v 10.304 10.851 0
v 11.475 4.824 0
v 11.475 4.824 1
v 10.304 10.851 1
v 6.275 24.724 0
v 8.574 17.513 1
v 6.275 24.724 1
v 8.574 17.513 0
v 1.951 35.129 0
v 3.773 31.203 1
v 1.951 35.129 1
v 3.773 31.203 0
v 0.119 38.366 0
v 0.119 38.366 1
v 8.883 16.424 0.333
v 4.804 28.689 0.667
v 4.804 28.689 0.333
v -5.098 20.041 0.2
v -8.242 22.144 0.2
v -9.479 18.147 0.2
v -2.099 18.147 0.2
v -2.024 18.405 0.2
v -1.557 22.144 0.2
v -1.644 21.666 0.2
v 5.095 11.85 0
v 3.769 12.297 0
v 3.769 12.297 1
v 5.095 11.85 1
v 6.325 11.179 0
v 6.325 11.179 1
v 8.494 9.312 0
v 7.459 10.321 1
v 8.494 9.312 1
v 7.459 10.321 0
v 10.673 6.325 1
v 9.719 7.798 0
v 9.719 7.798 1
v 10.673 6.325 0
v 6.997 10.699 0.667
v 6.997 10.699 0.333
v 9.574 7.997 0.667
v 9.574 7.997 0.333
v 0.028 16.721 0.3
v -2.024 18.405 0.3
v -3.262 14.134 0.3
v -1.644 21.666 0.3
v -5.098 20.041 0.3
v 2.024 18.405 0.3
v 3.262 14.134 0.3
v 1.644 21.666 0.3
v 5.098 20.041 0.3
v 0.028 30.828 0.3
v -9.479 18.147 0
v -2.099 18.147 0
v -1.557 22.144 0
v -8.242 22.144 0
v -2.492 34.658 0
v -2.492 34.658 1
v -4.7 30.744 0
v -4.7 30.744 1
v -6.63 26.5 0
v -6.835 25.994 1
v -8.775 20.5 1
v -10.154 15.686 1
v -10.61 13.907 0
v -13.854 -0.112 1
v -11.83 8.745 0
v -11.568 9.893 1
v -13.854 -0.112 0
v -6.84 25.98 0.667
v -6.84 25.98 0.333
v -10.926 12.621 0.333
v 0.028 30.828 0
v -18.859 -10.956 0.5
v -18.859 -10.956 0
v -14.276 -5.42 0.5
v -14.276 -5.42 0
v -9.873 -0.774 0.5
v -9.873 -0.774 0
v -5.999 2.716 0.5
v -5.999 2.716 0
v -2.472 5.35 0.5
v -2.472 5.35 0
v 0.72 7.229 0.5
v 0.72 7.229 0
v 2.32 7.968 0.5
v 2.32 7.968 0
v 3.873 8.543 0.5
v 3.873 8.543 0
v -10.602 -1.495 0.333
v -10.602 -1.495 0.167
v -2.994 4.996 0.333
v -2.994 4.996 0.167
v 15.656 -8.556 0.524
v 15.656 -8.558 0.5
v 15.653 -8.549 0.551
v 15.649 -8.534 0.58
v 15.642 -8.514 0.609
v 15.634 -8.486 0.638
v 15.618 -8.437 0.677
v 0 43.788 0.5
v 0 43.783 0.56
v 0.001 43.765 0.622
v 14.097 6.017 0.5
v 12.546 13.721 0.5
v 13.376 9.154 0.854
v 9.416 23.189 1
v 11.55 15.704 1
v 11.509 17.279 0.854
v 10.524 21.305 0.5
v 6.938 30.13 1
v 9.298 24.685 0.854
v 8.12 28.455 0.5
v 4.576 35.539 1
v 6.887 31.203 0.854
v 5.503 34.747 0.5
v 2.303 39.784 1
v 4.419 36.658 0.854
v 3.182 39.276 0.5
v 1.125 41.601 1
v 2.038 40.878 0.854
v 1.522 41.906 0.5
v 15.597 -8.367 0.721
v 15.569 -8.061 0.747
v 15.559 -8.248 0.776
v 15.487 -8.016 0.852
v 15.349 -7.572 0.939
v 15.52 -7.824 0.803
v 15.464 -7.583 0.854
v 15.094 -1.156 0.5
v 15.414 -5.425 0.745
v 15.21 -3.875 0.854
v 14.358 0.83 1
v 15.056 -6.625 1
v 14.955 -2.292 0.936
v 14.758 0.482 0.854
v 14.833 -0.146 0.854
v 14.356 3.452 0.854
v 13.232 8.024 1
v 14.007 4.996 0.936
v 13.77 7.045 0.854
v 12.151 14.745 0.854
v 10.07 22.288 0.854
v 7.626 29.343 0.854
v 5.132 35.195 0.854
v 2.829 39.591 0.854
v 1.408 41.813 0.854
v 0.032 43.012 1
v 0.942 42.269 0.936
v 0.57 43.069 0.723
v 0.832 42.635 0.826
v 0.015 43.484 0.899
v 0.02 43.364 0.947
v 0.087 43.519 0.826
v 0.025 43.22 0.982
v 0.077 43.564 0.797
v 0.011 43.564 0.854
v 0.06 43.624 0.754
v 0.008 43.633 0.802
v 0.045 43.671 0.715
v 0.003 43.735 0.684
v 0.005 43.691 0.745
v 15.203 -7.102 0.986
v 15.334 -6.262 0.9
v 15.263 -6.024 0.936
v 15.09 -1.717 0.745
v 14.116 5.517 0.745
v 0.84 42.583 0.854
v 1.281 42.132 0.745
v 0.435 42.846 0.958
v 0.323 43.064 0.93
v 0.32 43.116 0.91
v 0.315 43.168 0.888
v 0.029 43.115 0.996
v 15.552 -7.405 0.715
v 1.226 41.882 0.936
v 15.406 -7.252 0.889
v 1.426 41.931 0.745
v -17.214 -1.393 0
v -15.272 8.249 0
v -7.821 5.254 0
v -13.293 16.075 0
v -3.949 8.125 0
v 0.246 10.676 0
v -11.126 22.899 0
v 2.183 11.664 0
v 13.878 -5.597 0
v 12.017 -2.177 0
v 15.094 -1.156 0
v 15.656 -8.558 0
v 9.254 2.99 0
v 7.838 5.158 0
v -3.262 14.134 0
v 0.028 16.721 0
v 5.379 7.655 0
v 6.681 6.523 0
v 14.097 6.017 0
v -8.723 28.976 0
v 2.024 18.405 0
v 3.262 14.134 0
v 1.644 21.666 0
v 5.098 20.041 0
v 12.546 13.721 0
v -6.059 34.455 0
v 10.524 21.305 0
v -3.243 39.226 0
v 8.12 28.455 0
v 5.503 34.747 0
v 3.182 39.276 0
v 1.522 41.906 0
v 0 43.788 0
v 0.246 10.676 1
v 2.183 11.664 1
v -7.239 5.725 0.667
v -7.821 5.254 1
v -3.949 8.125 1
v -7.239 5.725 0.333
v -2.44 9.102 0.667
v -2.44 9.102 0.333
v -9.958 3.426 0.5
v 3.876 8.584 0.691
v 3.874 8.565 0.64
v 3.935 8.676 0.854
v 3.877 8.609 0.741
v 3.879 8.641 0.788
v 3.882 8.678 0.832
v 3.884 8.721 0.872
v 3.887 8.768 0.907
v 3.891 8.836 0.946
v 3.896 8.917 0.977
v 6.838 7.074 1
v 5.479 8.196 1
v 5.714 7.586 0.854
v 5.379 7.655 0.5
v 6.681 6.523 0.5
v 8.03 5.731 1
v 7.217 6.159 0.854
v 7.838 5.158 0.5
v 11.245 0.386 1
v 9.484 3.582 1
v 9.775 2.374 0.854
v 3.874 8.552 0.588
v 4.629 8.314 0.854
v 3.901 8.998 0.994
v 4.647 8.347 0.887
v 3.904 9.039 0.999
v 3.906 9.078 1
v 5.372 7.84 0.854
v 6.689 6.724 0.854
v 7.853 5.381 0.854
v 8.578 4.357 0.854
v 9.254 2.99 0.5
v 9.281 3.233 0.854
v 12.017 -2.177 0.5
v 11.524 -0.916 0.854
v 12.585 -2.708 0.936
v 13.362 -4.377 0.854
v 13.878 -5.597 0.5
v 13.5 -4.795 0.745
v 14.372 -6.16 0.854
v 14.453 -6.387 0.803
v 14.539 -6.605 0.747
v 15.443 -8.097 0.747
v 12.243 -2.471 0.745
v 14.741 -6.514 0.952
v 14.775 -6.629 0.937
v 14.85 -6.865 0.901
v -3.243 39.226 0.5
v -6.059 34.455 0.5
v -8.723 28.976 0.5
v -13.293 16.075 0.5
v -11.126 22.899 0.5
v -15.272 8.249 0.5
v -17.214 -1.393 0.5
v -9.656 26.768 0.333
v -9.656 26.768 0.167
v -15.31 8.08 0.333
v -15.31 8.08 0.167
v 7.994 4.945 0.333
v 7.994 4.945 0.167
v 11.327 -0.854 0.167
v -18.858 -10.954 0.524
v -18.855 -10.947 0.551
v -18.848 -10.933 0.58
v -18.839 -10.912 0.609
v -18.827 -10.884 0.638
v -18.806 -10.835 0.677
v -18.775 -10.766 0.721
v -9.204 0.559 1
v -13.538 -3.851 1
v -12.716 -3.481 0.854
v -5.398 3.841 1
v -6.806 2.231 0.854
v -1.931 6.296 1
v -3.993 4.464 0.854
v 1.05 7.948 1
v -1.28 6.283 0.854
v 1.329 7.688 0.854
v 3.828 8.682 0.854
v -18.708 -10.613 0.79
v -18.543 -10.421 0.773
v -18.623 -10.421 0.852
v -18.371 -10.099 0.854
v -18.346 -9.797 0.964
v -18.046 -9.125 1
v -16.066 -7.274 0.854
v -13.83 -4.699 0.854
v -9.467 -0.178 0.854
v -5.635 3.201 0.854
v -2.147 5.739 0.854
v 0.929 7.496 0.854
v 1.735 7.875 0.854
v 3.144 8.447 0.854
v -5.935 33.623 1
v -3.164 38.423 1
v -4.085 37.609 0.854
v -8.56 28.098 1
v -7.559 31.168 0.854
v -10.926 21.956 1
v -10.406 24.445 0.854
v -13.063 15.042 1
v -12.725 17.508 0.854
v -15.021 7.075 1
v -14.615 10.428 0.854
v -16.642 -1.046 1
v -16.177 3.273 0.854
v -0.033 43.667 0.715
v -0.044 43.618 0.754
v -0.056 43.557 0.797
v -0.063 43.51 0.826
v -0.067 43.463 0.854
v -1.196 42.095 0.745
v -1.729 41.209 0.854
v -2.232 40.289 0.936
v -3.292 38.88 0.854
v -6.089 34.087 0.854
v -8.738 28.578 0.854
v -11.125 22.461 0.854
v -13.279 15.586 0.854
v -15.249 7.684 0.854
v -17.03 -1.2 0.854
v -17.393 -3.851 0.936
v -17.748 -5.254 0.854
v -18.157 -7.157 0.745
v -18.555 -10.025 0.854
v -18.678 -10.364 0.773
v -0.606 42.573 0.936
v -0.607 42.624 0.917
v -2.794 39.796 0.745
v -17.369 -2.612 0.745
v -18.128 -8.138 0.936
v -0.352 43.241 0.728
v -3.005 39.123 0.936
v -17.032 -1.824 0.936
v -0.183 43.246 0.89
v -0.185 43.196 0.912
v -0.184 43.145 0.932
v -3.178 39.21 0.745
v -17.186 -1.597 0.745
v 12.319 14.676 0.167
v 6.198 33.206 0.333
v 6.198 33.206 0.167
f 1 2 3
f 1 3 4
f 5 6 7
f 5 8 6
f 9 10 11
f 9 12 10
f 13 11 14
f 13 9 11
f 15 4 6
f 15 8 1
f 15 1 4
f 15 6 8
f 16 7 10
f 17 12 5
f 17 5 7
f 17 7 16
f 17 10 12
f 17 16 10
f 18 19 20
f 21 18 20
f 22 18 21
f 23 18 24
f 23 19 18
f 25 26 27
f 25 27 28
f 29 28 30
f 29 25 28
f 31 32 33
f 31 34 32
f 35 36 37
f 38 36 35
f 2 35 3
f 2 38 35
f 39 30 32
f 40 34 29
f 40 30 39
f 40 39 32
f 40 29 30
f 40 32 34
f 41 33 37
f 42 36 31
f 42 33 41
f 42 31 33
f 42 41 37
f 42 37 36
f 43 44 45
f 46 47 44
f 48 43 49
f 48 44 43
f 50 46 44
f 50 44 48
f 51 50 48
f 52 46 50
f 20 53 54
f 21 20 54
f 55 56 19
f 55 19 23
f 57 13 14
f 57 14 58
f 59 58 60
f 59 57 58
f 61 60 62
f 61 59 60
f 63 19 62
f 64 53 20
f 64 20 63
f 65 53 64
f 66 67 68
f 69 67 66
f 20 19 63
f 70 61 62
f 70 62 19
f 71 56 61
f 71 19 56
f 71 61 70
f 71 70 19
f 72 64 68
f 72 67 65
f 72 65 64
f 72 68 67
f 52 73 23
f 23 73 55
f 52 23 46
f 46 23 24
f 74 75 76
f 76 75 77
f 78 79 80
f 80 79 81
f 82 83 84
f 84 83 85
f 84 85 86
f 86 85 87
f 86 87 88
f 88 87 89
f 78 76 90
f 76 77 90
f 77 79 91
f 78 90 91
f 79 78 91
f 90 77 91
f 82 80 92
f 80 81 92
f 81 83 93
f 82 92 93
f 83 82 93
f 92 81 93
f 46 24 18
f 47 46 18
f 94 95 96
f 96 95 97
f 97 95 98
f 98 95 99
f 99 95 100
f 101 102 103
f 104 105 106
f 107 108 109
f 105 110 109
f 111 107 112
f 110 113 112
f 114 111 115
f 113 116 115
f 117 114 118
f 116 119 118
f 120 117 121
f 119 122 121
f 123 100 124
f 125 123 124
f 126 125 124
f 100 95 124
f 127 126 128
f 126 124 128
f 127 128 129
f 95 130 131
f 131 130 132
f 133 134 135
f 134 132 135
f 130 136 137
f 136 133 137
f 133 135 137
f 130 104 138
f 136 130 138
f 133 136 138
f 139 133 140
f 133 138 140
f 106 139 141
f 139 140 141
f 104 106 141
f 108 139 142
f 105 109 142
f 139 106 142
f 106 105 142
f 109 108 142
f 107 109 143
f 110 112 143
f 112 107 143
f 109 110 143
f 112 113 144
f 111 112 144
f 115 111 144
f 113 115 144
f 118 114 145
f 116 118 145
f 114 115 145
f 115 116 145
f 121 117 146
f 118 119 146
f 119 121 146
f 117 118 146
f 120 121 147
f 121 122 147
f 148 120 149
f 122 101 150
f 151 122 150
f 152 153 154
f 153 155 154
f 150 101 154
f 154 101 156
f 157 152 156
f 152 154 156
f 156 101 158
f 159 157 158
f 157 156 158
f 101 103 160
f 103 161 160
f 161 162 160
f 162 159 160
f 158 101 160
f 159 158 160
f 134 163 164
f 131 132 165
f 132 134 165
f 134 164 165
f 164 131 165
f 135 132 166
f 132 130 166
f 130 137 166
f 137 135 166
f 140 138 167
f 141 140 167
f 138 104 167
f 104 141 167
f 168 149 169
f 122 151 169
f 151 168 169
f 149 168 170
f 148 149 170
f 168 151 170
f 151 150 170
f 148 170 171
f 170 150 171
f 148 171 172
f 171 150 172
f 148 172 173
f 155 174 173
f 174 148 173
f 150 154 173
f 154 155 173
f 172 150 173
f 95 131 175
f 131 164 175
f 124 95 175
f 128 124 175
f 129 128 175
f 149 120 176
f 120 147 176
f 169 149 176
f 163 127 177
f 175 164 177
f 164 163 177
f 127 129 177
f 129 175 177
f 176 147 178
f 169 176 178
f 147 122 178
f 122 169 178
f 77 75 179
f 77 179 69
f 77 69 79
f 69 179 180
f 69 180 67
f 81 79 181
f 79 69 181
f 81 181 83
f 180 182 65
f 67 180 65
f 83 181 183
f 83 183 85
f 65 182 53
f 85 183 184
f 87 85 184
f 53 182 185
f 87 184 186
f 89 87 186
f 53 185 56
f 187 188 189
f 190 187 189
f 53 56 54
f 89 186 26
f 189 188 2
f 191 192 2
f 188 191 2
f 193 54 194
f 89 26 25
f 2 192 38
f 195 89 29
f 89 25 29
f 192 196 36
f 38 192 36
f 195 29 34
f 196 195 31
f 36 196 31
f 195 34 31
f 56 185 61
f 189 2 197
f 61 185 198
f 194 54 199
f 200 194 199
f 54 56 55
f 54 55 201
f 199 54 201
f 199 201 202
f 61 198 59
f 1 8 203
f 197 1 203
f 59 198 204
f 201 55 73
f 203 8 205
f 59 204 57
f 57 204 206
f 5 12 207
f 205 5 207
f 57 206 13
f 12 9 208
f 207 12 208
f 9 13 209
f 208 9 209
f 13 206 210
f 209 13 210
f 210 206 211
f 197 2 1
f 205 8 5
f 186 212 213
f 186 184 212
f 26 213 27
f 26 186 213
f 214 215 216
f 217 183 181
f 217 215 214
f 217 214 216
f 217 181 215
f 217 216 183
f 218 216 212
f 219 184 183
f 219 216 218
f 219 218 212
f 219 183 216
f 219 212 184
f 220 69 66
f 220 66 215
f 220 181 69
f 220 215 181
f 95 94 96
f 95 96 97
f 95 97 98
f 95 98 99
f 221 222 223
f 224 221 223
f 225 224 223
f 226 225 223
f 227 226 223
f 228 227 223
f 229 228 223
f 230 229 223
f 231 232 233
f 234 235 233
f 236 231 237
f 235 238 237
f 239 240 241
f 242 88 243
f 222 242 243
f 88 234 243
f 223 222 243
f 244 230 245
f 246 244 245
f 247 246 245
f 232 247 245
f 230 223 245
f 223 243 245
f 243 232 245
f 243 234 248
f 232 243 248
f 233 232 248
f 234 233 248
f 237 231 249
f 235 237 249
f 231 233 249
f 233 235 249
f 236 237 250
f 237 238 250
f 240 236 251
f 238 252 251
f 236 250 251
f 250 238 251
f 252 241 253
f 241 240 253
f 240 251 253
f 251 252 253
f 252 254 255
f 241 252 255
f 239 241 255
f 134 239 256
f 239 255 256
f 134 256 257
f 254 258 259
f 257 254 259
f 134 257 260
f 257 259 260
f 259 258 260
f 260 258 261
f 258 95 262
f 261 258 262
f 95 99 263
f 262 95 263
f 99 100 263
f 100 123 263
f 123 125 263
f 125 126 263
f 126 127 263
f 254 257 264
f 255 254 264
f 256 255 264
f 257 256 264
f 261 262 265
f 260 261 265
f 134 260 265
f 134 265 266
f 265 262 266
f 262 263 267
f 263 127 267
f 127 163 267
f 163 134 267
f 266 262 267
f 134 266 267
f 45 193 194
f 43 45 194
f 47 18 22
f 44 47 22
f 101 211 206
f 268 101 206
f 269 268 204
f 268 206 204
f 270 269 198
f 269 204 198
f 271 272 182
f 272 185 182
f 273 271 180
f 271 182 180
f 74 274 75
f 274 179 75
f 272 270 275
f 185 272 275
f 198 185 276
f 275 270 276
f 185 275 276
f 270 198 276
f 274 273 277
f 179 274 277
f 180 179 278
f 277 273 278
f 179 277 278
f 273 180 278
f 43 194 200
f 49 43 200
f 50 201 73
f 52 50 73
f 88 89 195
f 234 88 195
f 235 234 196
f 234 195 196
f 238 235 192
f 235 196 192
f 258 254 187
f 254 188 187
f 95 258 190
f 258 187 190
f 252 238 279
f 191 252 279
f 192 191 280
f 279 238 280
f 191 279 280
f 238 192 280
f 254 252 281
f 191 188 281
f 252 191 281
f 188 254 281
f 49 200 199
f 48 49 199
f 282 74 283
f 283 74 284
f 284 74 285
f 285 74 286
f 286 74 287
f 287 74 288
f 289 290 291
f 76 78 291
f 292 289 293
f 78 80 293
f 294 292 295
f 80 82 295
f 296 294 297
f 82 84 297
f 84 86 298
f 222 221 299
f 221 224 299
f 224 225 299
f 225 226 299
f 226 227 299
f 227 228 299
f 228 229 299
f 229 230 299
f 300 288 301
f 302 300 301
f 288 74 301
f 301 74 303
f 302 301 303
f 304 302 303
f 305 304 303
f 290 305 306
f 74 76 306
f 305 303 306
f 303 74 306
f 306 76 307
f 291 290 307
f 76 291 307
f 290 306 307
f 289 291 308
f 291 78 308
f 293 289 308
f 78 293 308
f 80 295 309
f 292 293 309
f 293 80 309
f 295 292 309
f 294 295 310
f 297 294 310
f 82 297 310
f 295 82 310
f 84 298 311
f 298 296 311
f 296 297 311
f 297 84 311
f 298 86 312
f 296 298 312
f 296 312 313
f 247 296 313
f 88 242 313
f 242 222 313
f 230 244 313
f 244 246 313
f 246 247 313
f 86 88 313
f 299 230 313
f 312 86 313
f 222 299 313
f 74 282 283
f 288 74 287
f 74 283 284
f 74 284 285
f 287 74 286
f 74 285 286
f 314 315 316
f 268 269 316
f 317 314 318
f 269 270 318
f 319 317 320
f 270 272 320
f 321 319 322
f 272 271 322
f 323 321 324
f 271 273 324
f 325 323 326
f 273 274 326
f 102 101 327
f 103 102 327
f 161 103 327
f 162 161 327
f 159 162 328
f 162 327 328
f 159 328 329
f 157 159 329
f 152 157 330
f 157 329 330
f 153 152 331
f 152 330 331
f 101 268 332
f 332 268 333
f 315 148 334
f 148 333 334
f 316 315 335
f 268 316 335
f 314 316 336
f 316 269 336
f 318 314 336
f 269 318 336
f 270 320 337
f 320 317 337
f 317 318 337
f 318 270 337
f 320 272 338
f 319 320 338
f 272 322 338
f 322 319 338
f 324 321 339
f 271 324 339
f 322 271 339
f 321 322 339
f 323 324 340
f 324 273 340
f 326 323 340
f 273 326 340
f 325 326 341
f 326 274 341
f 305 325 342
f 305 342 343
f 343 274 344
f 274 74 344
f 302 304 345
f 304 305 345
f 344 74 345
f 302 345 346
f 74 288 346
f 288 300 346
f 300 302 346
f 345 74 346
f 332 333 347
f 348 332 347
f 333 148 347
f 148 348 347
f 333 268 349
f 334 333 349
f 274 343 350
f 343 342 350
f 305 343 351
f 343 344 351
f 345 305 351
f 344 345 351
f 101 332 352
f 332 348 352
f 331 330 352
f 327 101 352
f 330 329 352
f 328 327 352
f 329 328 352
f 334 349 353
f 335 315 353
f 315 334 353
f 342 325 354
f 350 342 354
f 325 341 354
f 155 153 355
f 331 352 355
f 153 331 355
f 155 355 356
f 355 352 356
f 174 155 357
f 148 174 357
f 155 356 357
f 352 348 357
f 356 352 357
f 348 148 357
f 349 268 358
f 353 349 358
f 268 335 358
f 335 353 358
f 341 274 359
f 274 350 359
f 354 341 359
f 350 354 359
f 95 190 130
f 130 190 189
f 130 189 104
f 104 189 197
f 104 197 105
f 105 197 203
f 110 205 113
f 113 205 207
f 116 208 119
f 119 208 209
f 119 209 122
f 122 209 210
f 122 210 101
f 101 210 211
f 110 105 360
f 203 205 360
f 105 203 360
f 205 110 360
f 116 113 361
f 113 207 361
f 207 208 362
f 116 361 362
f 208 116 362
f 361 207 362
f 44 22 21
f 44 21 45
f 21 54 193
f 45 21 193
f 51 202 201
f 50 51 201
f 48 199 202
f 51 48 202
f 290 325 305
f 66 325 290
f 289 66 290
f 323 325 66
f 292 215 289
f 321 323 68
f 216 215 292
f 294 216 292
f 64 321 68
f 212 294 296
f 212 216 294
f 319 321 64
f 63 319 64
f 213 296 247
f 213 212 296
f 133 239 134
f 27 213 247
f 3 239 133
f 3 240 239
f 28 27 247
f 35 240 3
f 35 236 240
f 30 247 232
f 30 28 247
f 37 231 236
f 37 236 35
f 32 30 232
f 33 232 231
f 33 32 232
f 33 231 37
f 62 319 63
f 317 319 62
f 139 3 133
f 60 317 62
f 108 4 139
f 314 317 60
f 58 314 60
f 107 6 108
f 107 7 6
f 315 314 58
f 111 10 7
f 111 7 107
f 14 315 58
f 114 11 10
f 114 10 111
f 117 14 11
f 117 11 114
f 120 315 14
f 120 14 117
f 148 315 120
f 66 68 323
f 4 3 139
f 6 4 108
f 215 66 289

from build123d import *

# Parameters (mm, degrees)
PAD_DEPTH    = 1
FILLET_R     = 0.5
POCKET_DEPTH = 1
SKETCH003_W  = 10.2
SKETCH003_H  = 3.996945
PAD001_DEPTH = 0.2
PAD002_DEPTH = 0.3


with BuildPart() as part:
    # Sketch001 → Pad (new body)
    with BuildSketch(Plane.XY):
        with BuildLine():
            add(Edge.make_bspline(
                [(0, 43.78817), (-12.289536, 28.042601), (-15.7306, 7.8132), (-18.858877, -10.956354)],
                knots=[0, 0, 0, 0, 1, 1, 1, 1], degree=3))
            add(Edge.make_bspline(
                [(-18.858877, -10.956354), (-10.308308, 0), (-2.591932, 6.45762), (3.873133, 8.543123)],
                knots=[0, 0, 0, 0, 1, 1, 1, 1], degree=3))
            add(Edge.make_bspline(
                [(3.873133, 8.543123), (8.982622, 6.144794), (10.233923, 0), (15.656239, -8.558024)],
                knots=[0, 0, 0, 0, 1, 1, 1, 1], degree=3))
            add(Edge.make_bspline(
                [(15.656239, -8.558024), (14.613485, 15.946667), (5.332988, 38.261578), (0, 43.78817)],
                knots=[0, 0, 0, 0, 1, 1, 1, 1], degree=3))
        make_face()
    extrude(amount=PAD_DEPTH)

    # Fillet
    fillet_edges = [part.edges().sort_by_distance(p)[0] for p in [
        (-12.829649, 17.66823, 1),
        (-8.732052, 0.31512, 1),
        (10.543217, 0.647396, 1),
        (11.271646, 18.714661, 1),
    ]]
    fillet(fillet_edges, radius=FILLET_R)

    # Sketch → Pocket (cut)
    with BuildSketch(Plane.XY):
        with BuildLine():
            add(Edge.make_bspline(
                [(0.119224, 38.365856), (-8.848454, 26.999847), (-10.93396, 11.77566), (-13.853666, -0.111724)],
                knots=[0, 0, 0, 0, 1, 1, 1, 1], degree=3))
            add(Edge.make_bspline(
                [(-13.853666, -0.111724), (-7.180041, 6.040518), (-0.506425, 11.045732), (3.768858, 12.297033)],
                knots=[0, 0, 0, 0, 1, 1, 1, 1], degree=3, weights=[1, 2.160557, 1, 1]))
            add(Edge.make_bspline(
                [(3.768858, 12.297033), (7.314217, 11.462833), (9.921097, 8.021747), (11.475028, 4.824064)],
                knots=[0, 0, 0, 0, 1, 1, 1, 1], degree=3))
            add(Edge.make_bspline(
                [(11.475028, 4.824064), (9.921097, 15.008192), (4.811611, 31.066584), (0.119224, 38.365856)],
                knots=[0, 0, 0, 0, 1, 1, 1, 1], degree=3))
        make_face()
    extrude(amount=POCKET_DEPTH, mode=Mode.SUBTRACT)

    # Sketch003 → Pad001 (join)
    with BuildSketch(Plane.XY):
        with Locations((-5.1, 20.145682)):
            Rectangle(SKETCH003_W, SKETCH003_H)
    extrude(amount=PAD001_DEPTH)

    # Sketch002 → Pad002 (join)
    with BuildSketch(Plane.XY):
        Polygon((0.028302, 30.828405), (-1.644275, 21.665611), (-5.097521, 20.0411), (-2.024461, 18.404793), (-3.261668, 14.134434), (0.028302, 16.720612), (3.261668, 14.134434), (2.024461, 18.404793), (5.097521, 20.0411), (1.644275, 21.665611), align=None)
    extrude(amount=PAD002_DEPTH)


solid = part.part
